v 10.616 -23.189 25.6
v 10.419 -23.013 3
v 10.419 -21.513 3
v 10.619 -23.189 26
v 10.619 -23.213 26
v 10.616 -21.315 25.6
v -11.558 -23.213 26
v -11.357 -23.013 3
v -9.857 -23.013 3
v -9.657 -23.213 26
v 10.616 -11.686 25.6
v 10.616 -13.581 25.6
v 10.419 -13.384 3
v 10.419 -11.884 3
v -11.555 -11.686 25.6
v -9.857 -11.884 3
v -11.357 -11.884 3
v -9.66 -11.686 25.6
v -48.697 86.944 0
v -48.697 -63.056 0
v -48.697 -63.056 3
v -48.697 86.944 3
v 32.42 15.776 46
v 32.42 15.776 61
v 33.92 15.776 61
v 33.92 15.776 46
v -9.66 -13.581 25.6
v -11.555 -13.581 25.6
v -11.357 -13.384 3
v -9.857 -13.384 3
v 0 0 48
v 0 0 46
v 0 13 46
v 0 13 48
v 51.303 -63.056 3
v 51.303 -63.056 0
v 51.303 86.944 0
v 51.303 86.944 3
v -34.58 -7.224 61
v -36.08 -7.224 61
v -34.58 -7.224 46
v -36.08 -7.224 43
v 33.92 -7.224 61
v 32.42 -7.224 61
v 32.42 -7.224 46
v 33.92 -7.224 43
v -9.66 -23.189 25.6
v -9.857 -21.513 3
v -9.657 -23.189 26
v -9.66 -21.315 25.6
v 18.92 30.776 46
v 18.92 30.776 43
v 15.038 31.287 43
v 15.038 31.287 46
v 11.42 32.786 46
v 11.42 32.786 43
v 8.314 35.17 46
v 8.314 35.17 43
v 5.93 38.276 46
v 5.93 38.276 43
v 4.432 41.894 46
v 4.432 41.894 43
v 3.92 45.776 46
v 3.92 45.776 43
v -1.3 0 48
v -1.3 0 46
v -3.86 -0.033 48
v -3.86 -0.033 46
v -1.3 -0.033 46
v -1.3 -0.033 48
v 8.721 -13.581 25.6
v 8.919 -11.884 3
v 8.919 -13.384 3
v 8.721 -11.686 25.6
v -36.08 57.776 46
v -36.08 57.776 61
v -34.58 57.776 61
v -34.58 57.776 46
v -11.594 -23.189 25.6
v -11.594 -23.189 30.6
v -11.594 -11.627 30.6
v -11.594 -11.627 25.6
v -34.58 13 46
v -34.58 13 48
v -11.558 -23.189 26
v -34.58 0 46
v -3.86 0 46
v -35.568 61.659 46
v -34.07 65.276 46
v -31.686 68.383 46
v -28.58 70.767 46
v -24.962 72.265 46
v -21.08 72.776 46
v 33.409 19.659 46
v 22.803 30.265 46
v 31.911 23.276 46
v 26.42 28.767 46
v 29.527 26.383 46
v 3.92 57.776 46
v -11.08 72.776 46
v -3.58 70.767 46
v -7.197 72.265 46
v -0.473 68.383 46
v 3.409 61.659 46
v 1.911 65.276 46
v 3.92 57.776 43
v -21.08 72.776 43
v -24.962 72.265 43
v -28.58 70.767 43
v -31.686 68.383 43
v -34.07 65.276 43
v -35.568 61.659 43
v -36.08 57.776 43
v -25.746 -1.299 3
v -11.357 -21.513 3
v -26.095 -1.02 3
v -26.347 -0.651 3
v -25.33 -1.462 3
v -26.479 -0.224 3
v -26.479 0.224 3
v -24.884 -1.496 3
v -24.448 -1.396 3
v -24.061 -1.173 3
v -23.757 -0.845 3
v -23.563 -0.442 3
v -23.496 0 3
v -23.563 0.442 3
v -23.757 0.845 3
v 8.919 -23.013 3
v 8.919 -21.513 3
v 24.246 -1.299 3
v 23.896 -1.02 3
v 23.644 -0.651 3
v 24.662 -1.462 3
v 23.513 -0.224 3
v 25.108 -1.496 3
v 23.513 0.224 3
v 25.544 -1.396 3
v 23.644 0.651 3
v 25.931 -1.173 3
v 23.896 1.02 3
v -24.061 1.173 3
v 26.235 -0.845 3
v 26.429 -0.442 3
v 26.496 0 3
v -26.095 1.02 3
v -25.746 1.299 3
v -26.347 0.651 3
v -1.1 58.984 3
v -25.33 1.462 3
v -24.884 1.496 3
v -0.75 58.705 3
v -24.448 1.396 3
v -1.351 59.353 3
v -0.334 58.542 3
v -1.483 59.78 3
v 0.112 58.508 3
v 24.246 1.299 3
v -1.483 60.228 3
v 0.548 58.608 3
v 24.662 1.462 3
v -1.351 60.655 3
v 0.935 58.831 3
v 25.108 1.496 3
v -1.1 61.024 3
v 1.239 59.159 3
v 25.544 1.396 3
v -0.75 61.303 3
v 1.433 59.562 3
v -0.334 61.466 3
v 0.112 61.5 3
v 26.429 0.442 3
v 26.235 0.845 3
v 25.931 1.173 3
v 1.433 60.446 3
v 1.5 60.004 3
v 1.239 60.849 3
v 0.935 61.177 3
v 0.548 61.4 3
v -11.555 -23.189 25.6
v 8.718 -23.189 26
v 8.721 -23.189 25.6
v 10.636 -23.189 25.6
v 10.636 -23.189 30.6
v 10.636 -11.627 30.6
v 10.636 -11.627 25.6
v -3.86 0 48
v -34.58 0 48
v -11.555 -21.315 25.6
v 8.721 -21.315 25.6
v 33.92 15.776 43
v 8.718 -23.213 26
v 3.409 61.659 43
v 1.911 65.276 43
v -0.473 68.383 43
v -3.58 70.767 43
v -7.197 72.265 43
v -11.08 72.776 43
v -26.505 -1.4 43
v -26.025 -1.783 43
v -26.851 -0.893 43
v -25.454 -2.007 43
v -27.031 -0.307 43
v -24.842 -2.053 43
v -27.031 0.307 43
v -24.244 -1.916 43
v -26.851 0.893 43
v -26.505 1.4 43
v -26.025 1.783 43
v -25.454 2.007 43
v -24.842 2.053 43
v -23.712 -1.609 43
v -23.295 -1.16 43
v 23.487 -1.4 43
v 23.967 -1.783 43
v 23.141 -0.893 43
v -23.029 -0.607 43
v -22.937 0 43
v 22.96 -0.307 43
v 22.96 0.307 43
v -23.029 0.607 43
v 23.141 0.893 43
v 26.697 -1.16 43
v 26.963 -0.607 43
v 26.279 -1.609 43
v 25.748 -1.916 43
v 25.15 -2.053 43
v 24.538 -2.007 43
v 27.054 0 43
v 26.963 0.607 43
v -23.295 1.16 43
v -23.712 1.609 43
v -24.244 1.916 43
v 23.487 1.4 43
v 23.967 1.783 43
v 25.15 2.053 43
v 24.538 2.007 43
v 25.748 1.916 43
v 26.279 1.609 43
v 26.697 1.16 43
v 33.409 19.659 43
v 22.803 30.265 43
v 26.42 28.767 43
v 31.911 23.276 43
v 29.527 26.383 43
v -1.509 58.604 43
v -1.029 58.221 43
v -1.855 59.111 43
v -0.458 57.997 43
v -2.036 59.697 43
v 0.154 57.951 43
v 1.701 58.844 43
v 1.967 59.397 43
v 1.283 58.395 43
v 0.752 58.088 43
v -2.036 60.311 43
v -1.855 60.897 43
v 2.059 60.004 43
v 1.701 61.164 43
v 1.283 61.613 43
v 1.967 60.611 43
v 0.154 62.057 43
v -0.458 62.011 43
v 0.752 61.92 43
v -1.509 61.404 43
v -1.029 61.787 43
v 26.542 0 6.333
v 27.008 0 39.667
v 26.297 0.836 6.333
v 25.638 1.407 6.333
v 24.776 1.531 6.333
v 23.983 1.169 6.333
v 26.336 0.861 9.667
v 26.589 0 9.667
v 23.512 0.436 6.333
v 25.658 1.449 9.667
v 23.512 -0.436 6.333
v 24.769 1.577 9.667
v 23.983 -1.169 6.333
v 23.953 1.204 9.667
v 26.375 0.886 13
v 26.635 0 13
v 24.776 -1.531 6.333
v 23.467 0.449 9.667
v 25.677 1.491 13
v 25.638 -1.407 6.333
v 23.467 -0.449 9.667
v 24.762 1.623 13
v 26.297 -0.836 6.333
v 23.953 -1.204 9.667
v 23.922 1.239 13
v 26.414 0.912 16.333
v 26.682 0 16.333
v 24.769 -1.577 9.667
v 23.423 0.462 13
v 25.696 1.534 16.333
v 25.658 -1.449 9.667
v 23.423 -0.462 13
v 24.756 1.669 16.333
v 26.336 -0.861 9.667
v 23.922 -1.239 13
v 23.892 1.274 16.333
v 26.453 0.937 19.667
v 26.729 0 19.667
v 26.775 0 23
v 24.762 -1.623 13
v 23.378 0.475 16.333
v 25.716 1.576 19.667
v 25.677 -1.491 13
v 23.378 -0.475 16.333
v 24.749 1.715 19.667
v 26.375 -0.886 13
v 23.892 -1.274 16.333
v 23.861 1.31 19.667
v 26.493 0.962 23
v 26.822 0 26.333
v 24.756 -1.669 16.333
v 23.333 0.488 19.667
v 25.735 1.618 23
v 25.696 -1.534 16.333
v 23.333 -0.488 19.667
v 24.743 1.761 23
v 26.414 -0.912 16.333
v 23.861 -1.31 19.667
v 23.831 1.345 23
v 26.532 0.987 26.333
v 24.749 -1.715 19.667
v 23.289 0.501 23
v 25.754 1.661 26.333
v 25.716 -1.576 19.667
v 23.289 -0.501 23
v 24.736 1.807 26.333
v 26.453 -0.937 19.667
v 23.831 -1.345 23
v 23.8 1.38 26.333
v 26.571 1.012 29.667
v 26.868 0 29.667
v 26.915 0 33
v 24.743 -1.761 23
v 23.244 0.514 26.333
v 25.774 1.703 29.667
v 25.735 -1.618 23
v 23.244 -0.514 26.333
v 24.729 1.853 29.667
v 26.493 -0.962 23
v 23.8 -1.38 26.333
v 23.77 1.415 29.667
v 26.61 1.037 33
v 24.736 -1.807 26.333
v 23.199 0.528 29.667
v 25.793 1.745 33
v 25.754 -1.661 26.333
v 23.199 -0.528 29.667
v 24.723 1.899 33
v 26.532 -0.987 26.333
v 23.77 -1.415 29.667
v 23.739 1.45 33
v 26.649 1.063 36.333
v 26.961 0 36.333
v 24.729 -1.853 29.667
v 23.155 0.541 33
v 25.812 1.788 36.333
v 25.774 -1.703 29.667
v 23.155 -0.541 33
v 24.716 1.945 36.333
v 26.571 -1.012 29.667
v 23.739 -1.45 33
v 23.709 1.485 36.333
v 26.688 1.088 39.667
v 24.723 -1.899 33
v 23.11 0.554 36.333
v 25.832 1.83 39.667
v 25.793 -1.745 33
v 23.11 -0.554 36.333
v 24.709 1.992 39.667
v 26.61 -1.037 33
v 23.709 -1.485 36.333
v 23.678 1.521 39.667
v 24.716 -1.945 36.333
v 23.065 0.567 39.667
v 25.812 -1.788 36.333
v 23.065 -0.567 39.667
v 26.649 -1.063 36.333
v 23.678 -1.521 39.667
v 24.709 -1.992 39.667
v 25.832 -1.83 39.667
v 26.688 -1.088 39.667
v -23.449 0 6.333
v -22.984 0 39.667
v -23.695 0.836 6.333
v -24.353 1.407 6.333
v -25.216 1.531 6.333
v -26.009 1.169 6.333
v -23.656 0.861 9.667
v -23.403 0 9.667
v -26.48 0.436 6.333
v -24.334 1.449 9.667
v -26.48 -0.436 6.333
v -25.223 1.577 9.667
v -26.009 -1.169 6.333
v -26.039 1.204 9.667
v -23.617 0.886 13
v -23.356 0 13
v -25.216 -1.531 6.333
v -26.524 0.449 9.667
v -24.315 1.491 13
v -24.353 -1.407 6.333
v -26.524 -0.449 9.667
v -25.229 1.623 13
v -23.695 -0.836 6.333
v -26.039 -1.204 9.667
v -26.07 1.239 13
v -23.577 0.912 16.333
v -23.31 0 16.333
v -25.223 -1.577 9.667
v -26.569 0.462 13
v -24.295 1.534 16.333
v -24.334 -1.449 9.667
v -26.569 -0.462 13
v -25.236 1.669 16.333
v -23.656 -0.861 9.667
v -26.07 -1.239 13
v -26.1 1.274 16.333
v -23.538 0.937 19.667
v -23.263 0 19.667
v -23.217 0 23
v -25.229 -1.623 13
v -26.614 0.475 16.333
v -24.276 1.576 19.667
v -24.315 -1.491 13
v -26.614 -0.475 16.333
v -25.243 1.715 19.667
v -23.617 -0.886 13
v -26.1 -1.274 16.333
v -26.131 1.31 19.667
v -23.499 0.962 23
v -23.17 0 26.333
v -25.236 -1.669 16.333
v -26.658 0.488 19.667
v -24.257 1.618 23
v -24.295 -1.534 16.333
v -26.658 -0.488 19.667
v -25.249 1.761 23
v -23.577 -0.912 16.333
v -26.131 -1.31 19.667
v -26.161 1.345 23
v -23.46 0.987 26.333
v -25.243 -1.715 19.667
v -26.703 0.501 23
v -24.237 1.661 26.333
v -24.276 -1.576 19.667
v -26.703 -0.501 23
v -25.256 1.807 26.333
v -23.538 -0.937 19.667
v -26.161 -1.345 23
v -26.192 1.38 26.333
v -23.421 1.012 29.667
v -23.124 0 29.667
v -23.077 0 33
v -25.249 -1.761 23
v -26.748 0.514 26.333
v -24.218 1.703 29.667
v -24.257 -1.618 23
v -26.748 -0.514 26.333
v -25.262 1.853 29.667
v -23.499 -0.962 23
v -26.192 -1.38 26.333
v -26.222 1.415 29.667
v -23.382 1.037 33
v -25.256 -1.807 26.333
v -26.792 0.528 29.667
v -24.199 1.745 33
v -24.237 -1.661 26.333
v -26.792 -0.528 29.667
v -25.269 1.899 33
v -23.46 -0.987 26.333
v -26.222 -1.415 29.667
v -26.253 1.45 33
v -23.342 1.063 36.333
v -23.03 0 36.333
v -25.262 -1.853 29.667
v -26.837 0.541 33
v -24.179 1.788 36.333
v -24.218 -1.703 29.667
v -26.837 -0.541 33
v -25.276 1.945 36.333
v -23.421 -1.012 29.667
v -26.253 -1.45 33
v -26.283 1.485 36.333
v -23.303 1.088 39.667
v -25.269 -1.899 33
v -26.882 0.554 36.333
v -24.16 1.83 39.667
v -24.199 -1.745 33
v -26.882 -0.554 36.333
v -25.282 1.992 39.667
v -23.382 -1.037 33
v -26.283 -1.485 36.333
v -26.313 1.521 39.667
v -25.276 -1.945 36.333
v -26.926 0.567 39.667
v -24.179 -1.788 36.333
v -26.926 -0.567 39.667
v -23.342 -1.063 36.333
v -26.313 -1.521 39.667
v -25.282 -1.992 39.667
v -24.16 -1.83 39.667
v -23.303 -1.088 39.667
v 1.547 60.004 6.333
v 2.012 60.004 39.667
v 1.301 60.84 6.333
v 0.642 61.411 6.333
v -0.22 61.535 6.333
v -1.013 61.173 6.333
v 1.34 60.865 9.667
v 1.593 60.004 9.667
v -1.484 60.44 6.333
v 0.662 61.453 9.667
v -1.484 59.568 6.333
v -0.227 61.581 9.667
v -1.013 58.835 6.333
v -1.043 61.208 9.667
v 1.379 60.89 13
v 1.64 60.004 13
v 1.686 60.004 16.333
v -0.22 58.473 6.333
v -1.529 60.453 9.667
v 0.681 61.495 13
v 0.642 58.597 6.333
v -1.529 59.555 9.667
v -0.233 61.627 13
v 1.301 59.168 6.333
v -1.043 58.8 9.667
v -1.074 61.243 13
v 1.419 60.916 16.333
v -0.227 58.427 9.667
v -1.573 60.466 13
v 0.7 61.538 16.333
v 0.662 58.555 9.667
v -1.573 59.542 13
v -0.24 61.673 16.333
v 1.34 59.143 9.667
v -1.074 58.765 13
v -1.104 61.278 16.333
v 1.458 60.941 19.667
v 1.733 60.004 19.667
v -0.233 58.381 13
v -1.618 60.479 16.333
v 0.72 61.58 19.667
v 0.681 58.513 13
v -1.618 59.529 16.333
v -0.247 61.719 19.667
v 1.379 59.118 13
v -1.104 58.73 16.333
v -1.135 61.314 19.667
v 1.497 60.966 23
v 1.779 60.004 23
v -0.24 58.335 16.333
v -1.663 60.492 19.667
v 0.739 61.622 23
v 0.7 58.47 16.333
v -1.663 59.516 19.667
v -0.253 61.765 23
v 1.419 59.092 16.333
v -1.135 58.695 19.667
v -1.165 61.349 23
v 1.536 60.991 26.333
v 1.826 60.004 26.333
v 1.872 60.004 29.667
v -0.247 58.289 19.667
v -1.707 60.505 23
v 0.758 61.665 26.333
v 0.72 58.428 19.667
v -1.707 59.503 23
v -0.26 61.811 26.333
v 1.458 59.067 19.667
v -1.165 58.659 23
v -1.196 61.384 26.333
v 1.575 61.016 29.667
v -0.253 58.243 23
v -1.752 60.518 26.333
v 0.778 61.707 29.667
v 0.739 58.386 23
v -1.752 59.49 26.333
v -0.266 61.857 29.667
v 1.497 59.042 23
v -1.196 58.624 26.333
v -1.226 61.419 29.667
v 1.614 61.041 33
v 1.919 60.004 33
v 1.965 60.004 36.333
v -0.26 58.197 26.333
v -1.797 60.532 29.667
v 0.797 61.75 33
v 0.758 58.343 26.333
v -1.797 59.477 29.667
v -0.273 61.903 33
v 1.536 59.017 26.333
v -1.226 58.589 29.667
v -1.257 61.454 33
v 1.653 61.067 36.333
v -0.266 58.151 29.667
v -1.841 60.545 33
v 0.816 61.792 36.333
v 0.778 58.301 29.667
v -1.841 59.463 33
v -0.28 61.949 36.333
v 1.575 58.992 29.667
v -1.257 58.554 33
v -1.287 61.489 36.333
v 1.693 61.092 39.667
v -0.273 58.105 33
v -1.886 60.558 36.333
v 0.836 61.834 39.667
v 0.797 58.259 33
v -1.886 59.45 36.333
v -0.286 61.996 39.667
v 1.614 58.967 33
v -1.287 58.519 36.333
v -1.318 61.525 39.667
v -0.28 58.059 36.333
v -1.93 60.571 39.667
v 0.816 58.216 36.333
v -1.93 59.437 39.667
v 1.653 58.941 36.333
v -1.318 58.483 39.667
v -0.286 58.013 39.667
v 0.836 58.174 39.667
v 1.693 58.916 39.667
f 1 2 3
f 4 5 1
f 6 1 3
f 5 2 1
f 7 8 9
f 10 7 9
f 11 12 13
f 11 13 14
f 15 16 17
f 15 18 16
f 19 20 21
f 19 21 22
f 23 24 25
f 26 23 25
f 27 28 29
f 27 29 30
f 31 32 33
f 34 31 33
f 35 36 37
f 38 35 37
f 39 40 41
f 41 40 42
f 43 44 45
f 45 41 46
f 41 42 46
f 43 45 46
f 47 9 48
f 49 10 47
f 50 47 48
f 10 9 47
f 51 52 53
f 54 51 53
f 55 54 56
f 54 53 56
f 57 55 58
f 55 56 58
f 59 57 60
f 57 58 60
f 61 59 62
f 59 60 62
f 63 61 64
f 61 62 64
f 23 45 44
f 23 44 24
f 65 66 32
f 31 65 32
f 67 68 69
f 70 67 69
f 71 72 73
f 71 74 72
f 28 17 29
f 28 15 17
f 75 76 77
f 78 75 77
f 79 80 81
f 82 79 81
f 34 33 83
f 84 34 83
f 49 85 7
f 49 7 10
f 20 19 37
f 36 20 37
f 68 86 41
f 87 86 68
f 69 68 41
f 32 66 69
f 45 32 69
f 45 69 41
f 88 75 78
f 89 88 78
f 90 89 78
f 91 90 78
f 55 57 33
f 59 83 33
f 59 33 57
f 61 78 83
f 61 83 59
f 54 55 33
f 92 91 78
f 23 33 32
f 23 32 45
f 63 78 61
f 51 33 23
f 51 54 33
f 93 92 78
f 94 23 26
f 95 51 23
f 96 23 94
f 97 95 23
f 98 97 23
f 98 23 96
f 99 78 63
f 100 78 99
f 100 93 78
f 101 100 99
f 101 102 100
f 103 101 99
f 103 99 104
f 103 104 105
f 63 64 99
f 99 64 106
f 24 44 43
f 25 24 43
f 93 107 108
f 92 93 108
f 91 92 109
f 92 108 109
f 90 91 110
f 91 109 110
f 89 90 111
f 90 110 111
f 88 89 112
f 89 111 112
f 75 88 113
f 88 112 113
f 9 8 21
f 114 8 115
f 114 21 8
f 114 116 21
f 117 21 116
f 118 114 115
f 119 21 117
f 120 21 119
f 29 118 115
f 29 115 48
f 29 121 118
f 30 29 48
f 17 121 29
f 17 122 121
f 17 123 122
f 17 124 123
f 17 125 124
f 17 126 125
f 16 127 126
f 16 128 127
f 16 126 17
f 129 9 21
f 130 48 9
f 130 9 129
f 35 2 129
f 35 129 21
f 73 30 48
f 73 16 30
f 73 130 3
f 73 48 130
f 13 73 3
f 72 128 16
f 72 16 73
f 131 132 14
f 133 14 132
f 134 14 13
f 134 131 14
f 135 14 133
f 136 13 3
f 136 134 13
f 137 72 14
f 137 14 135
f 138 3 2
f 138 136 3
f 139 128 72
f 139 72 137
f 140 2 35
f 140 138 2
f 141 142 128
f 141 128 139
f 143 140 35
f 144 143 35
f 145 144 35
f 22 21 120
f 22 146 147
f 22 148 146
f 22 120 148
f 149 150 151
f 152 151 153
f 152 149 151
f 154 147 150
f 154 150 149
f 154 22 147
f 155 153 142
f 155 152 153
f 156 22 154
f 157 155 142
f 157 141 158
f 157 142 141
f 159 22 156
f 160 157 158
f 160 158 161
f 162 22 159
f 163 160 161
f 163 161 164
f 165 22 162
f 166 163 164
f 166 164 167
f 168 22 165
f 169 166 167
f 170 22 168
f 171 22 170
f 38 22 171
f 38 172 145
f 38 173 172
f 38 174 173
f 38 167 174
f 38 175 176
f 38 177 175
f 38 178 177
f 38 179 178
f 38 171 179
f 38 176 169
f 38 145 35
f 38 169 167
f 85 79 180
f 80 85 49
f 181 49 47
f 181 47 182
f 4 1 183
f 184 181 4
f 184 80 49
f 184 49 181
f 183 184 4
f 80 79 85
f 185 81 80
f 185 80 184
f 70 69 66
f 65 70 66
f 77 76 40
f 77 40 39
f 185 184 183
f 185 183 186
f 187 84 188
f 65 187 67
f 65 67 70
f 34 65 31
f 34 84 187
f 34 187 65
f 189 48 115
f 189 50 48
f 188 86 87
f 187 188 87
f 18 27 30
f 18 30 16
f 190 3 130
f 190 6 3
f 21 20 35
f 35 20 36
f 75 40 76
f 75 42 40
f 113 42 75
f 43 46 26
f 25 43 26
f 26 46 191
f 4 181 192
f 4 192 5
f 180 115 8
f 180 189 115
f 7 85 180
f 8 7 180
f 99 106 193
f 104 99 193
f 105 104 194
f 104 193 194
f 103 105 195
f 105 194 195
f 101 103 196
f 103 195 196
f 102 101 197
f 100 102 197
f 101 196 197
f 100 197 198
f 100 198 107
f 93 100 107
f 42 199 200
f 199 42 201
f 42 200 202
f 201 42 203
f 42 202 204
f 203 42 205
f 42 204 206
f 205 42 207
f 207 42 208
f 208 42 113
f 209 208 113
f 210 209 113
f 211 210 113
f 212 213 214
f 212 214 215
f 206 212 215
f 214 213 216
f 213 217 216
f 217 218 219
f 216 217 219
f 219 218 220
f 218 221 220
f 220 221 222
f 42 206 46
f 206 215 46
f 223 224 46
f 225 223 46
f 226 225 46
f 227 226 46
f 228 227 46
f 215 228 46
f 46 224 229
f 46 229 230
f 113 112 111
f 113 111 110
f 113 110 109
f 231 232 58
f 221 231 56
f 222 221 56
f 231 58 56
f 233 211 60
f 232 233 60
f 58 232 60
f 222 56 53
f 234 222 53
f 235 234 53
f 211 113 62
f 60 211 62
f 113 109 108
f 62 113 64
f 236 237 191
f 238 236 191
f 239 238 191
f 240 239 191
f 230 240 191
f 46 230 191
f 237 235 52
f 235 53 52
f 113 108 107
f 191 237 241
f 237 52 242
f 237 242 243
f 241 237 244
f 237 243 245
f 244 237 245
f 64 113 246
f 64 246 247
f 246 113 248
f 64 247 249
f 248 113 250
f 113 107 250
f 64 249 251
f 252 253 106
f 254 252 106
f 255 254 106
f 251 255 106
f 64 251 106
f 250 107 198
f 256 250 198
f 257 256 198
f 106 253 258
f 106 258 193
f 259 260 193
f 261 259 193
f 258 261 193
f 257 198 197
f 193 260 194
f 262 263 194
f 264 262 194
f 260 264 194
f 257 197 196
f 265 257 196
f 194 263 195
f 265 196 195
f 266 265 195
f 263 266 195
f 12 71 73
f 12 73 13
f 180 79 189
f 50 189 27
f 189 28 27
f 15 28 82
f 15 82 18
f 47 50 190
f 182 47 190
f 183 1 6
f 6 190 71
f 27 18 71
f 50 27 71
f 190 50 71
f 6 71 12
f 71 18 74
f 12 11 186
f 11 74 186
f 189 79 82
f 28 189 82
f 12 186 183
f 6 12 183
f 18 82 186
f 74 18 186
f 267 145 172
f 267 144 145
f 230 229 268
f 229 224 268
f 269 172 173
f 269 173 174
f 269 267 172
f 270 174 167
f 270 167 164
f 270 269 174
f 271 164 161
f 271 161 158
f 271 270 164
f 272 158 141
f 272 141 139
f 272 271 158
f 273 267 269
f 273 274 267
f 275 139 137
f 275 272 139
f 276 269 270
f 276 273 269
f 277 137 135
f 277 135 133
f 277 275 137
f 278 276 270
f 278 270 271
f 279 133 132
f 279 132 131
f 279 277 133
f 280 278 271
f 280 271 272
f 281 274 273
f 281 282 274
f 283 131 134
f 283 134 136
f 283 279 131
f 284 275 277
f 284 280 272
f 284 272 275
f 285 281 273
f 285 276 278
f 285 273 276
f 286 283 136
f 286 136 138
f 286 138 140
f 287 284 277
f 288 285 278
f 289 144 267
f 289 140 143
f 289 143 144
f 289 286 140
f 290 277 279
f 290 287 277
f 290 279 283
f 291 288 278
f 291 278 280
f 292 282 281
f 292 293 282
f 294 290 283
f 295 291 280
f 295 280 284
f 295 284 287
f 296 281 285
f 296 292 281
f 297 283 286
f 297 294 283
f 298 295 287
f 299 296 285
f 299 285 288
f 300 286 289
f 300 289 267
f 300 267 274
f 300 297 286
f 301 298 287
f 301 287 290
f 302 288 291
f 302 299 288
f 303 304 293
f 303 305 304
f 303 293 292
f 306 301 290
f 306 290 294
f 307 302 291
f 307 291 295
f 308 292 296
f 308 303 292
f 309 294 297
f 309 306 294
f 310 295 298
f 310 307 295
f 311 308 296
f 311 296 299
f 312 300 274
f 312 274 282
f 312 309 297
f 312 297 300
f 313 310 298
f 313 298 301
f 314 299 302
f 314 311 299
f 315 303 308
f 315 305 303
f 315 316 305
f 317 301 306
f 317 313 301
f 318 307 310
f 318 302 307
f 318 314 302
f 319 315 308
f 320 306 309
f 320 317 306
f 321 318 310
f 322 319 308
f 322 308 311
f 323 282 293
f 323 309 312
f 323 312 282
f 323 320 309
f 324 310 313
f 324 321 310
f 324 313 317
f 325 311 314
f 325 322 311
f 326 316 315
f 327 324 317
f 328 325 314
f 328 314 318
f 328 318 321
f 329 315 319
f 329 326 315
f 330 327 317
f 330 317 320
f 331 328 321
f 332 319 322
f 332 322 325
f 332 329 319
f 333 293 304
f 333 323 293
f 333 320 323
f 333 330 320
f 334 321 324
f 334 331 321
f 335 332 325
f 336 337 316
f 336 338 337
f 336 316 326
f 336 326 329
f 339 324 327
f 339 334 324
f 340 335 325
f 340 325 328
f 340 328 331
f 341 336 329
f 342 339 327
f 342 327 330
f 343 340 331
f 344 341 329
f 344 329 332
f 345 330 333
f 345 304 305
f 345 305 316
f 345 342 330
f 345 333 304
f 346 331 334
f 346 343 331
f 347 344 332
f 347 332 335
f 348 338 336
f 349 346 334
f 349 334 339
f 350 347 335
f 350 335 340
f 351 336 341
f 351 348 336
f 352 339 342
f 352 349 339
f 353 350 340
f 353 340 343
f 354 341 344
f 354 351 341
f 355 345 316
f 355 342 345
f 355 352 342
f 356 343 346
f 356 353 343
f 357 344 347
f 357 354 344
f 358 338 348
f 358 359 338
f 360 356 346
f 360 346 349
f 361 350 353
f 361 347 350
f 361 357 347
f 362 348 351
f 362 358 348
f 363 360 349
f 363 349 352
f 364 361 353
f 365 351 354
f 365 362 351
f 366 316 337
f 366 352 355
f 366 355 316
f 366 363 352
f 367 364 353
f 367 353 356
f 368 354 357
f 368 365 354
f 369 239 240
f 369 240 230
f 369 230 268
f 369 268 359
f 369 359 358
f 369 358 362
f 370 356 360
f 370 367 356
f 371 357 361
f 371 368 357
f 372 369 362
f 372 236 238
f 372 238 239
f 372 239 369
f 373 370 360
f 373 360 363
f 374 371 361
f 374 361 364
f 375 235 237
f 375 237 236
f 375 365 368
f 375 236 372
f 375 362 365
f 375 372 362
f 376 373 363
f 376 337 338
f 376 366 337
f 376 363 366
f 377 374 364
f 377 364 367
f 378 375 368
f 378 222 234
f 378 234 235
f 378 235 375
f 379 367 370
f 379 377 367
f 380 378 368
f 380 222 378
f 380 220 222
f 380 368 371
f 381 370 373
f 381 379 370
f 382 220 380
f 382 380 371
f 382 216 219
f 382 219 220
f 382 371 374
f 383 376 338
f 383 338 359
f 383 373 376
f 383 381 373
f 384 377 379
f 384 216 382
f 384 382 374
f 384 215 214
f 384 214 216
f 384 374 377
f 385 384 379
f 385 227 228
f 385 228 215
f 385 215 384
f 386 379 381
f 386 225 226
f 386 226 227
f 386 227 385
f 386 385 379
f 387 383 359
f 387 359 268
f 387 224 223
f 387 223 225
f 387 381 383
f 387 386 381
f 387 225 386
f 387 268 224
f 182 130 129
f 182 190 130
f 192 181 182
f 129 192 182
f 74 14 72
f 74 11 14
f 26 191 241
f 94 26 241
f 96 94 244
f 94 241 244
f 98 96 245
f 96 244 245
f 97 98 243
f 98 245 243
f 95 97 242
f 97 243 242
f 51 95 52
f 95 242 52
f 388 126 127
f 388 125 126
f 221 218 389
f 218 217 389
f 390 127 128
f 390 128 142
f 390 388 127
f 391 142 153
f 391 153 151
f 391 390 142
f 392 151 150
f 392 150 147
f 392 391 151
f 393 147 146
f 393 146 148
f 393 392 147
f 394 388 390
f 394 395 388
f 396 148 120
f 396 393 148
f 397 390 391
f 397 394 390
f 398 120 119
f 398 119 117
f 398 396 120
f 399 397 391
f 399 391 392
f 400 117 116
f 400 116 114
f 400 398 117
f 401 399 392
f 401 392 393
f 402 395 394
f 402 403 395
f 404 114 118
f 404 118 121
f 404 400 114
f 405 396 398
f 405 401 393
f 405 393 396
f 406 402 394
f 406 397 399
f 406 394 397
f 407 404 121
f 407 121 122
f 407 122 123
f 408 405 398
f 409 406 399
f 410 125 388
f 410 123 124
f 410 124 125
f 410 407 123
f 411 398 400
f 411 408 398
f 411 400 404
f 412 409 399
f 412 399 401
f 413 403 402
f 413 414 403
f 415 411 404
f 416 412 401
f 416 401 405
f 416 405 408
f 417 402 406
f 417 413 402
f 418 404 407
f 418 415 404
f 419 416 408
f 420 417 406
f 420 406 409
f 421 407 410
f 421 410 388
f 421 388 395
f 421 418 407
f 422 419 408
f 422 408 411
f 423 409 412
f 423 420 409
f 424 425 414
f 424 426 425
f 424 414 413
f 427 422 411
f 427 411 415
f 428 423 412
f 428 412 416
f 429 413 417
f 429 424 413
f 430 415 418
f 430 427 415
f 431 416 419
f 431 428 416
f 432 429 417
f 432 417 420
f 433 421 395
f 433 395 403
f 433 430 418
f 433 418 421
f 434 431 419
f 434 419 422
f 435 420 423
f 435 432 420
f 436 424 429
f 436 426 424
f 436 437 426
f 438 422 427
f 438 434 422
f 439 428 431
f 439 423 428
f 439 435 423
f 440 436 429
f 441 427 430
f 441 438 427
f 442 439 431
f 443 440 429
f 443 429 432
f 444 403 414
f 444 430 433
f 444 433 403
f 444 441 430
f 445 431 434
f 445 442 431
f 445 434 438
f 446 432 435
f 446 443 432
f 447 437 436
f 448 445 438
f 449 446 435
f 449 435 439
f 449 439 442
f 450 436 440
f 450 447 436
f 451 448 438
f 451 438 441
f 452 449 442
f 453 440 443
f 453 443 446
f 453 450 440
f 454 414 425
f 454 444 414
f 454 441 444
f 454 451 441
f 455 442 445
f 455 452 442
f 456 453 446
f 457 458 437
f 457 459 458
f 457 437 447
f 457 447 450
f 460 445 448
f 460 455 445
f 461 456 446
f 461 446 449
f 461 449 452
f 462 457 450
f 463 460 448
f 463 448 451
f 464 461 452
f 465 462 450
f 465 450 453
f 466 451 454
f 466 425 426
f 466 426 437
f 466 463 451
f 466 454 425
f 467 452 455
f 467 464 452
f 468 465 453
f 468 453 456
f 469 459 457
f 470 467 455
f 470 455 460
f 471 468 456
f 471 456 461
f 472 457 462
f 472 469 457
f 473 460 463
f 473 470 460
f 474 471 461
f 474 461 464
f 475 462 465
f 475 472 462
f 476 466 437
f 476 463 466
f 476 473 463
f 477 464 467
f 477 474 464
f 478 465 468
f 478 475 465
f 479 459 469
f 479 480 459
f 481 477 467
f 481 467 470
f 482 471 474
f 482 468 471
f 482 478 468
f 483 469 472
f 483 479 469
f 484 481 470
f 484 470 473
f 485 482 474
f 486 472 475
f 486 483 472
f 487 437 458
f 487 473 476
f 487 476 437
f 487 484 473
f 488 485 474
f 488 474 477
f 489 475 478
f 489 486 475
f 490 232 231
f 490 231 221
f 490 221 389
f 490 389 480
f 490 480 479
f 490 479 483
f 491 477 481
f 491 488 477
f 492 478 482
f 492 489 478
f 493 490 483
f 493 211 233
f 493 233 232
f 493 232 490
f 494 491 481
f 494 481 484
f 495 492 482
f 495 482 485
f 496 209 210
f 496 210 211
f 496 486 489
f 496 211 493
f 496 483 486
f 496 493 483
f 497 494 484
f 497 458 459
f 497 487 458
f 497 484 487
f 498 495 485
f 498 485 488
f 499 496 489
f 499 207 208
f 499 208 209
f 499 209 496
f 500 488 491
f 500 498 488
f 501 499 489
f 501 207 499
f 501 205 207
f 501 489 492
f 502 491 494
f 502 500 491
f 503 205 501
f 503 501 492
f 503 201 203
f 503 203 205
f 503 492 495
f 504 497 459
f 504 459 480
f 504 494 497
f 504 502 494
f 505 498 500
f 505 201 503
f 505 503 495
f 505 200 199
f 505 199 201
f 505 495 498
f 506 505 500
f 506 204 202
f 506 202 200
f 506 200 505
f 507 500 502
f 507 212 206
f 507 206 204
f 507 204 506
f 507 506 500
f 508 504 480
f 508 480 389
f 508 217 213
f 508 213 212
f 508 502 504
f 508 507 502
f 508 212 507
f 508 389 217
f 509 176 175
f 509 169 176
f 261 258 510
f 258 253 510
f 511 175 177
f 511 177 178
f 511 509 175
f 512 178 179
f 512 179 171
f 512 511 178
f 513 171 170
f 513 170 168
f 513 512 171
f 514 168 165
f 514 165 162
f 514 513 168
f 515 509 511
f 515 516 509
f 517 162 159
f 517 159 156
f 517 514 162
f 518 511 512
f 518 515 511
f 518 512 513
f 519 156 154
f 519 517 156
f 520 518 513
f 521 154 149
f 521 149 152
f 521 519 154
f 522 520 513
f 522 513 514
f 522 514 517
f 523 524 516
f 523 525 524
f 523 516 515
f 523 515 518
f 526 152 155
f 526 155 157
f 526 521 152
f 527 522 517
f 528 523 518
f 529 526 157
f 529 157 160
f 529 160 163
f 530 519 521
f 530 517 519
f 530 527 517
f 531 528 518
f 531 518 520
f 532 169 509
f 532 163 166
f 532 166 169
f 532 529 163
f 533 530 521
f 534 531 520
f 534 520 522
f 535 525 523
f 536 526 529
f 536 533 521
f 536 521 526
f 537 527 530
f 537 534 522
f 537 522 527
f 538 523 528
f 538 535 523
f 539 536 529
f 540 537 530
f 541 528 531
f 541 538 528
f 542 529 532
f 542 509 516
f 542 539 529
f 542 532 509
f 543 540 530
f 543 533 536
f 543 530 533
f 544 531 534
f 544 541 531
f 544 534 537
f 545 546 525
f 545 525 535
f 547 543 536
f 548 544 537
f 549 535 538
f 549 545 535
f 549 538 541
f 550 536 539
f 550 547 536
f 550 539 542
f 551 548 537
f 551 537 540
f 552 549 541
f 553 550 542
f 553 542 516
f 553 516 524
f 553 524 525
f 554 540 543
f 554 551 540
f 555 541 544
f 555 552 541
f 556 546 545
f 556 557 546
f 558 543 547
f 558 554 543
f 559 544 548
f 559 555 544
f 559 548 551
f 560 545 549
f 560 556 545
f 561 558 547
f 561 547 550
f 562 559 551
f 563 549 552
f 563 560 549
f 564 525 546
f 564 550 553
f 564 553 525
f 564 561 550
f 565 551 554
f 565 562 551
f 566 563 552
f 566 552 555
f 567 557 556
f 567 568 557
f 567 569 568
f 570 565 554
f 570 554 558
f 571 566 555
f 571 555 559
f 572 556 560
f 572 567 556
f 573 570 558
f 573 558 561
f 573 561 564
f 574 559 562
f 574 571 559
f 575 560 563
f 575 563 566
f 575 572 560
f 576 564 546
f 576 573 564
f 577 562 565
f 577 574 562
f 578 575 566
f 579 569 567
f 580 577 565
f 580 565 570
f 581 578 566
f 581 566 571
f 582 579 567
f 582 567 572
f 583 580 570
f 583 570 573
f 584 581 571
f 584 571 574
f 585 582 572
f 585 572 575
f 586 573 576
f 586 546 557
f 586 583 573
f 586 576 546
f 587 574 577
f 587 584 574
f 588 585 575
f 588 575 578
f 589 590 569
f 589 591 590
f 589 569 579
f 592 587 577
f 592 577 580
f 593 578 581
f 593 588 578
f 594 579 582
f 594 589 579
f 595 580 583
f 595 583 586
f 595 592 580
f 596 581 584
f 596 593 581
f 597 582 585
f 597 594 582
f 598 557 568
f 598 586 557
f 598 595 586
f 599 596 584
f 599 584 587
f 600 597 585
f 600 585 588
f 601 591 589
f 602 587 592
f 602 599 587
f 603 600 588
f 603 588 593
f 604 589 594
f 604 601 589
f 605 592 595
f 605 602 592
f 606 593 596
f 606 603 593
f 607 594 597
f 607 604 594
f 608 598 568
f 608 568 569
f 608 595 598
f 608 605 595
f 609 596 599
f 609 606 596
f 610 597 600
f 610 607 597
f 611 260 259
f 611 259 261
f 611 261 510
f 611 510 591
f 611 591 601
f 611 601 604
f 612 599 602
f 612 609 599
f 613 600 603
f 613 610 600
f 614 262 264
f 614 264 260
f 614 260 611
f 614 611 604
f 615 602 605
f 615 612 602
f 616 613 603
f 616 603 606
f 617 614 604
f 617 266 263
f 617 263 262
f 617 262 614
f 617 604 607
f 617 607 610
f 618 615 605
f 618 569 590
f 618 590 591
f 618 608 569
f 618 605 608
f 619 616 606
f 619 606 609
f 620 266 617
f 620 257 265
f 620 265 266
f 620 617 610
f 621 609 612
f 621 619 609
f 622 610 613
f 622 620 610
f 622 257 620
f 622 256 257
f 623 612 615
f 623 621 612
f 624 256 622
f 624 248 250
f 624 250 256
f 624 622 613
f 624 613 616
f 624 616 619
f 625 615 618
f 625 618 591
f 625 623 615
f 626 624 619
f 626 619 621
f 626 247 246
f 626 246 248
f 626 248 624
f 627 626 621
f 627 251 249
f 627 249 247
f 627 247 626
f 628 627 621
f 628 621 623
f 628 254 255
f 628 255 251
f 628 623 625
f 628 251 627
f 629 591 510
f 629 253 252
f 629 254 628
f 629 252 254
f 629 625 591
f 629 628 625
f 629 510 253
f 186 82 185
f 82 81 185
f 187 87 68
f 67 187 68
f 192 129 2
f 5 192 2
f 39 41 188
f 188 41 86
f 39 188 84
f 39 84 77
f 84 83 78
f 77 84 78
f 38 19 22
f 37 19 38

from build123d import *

# Parameters (mm, degrees)
F0_W          = 100
F0_H          = 150
F1_DEPTH      = 3
F2_R          = 1.5
F3_DEPTH      = 40
F3_TAPER      = -0.8
F4_W          = 1.5
F4_H          = 1.5
F5_DEPTH      = 23
F5_TAPER      = -0.5
F6_W          = 22.2306074575
F6_H          = 11.5619013086
F7_DEPTH      = 4.6
F7_DEPTH_BACK = 0.4
F9_DEPTH      = 3
F10_W         = 1.5
F10_H         = 65
F10_H_2       = 23
F11_DEPTH     = 15
F12_W         = 1.28
F12_H         = 13
F12_W_2       = 1.2995073211
F13_DEPTH     = 2


with BuildPart() as f1:
    # F0 (on Top) → F1 (new body)
    with BuildSketch(Plane.XY):
        with Locations((1.3026602566, 11.9441717863)):
            Rectangle(F0_W, F0_H)
    extrude(amount=F1_DEPTH)

    # F2 (on face) → F3 (join)
    with BuildSketch(Plane.XY.offset(3)):
        with Locations((0, 60.0040182471)):
            Circle(F2_R)
        with Locations((-24.9959174544, 0)):
            Circle(F2_R)
        with Locations((24.9958131462, 0)):
            Circle(F2_R)
    extrude(amount=F3_DEPTH, taper=F3_TAPER)

    # F4 (on face) → F5 (join)
    with BuildSketch(Plane.XY.offset(3)):
        with Locations((-10.6072969437, -12.6336732581)):
            Rectangle(F4_W, F4_H)
        with Locations((9.6686085388, -12.6336732581)):
            Rectangle(F4_W, F4_H)
        with Locations((-10.6072969437, -22.2625773102)):
            Rectangle(F4_W, F4_H)
        with Locations((9.6686085388, -22.2625773102)):
            Rectangle(F4_W, F4_H)
    extrude(amount=F5_DEPTH, taper=F5_TAPER)

    # F6 (on face) → F7 (join, two sides)
    with BuildSketch(Plane.XY.offset(26)) as f7_sk:
        with Locations((-0.4788641818, -17.4084207974)):
            Rectangle(F6_W, F6_H)
    extrude(amount=F7_DEPTH)
    extrude(f7_sk.sketch, amount=-F7_DEPTH_BACK)

    # F8 (on face) → F9 (join)
    with BuildSketch(Plane.XY.offset(43)):
        with BuildLine():
            Line((-36.0795073211, 57.7763375454), (-36.0795073211, -7.2236624546))
            Line((-36.0795073211, -7.2236624546), (33.9204926789, -7.2236624546))
            Line((33.9204926789, -7.2236624546), (33.9204926789, 15.7763375454))
            ThreePointArc((33.9204926789, 15.7763375454), (29.5270943967, 26.3829392632), (18.9204926789, 30.7763375454))
            ThreePointArc((18.9204926789, 30.7763375454), (8.3138909611, 35.1697358276), (3.9204926789, 45.7763375454))
            Line((3.9204926789, 45.7763375454), (3.9204926789, 57.7763375454))
            ThreePointArc((3.9204926789, 57.7763375454), (-0.4729056033, 68.3829392632), (-11.0795073211, 72.7763375454))
            Line((-11.0795073211, 72.7763375454), (-21.0795073211, 72.7763375454))
            ThreePointArc((-21.0795073211, 72.7763375454), (-31.6861090389, 68.3829392632), (-36.0795073211, 57.7763375454))
        make_face()
    extrude(amount=F9_DEPTH)

    # F10 (on face) → F11 (join)
    with BuildSketch(Plane.XY.offset(46)):
        with Locations((-35.3295073211, 25.2763375454)):
            Rectangle(F10_W, F10_H)
        with Locations((33.1704926789, 4.2763375454)):
            Rectangle(F10_W, F10_H_2)
    extrude(amount=F11_DEPTH)

    # F12 (on face) → F13 (join)
    with BuildSketch(Plane.XY.offset(46)):
        with Locations((-33.9395073211, 6.5)):
            Rectangle(F12_W, F12_H)
        with Locations((-32.6595073211, 6.5)):
            Rectangle(F12_W, F12_H)
        with Locations((-31.3795073211, 6.5)):
            Rectangle(F12_W, F12_H)
        with Locations((-30.0995073211, 6.5)):
            Rectangle(F12_W, F12_H)
        with Locations((-28.8195073211, 6.5)):
            Rectangle(F12_W, F12_H)
        with Locations((-27.5395073211, 6.5)):
            Rectangle(F12_W, F12_H)
        with Locations((-26.2595073211, 6.5)):
            Rectangle(F12_W, F12_H)
        with Locations((-24.9795073211, 6.5)):
            Rectangle(F12_W, F12_H)
        with Locations((-23.6995073211, 6.5)):
            Rectangle(F12_W, F12_H)
        with Locations((-22.4195073211, 6.5)):
            Rectangle(F12_W, F12_H)
        with Locations((-21.1395073211, 6.5)):
            Rectangle(F12_W, F12_H)
        with Locations((-19.8595073211, 6.5)):
            Rectangle(F12_W, F12_H)
        with Locations((-18.5795073211, 6.5)):
            Rectangle(F12_W, F12_H)
        with Locations((-17.2995073211, 6.5)):
            Rectangle(F12_W, F12_H)
        with Locations((-16.0195073211, 6.5)):
            Rectangle(F12_W, F12_H)
        with Locations((-14.7395073211, 6.5)):
            Rectangle(F12_W, F12_H)
        with Locations((-13.4595073211, 6.5)):
            Rectangle(F12_W, F12_H)
        with Locations((-12.1795073211, 6.5)):
            Rectangle(F12_W, F12_H)
        with Locations((-10.8995073211, 6.5)):
            Rectangle(F12_W, F12_H)
        with Locations((-9.6195073211, 6.5)):
            Rectangle(F12_W, F12_H)
        with Locations((-8.3395073211, 6.5)):
            Rectangle(F12_W, F12_H)
        with Locations((-7.0595073211, 6.5)):
            Rectangle(F12_W, F12_H)
        with Locations((-5.7795073211, 6.5)):
            Rectangle(F12_W, F12_H)
        with Locations((-4.4995073211, 6.5)):
            Rectangle(F12_W, F12_H)
        Polygon((-3.8595073211, 13), (-3.8595073211, 0), (-3.8595073211, -0.0326875597), (-2.5795073211, -0.0326875597), (-2.5795073211, 13), align=None)
        Polygon((-1.2995073211, 13), (-2.5795073211, 13), (-2.5795073211, -0.0326875597), (-1.2995073211, -0.0326875597), (-1.2995073211, 0), align=None)
        with Locations((-0.6497536606, 6.5)):
            Rectangle(F12_W_2, F12_H)
    extrude(amount=F13_DEPTH)


solid = f1.part
